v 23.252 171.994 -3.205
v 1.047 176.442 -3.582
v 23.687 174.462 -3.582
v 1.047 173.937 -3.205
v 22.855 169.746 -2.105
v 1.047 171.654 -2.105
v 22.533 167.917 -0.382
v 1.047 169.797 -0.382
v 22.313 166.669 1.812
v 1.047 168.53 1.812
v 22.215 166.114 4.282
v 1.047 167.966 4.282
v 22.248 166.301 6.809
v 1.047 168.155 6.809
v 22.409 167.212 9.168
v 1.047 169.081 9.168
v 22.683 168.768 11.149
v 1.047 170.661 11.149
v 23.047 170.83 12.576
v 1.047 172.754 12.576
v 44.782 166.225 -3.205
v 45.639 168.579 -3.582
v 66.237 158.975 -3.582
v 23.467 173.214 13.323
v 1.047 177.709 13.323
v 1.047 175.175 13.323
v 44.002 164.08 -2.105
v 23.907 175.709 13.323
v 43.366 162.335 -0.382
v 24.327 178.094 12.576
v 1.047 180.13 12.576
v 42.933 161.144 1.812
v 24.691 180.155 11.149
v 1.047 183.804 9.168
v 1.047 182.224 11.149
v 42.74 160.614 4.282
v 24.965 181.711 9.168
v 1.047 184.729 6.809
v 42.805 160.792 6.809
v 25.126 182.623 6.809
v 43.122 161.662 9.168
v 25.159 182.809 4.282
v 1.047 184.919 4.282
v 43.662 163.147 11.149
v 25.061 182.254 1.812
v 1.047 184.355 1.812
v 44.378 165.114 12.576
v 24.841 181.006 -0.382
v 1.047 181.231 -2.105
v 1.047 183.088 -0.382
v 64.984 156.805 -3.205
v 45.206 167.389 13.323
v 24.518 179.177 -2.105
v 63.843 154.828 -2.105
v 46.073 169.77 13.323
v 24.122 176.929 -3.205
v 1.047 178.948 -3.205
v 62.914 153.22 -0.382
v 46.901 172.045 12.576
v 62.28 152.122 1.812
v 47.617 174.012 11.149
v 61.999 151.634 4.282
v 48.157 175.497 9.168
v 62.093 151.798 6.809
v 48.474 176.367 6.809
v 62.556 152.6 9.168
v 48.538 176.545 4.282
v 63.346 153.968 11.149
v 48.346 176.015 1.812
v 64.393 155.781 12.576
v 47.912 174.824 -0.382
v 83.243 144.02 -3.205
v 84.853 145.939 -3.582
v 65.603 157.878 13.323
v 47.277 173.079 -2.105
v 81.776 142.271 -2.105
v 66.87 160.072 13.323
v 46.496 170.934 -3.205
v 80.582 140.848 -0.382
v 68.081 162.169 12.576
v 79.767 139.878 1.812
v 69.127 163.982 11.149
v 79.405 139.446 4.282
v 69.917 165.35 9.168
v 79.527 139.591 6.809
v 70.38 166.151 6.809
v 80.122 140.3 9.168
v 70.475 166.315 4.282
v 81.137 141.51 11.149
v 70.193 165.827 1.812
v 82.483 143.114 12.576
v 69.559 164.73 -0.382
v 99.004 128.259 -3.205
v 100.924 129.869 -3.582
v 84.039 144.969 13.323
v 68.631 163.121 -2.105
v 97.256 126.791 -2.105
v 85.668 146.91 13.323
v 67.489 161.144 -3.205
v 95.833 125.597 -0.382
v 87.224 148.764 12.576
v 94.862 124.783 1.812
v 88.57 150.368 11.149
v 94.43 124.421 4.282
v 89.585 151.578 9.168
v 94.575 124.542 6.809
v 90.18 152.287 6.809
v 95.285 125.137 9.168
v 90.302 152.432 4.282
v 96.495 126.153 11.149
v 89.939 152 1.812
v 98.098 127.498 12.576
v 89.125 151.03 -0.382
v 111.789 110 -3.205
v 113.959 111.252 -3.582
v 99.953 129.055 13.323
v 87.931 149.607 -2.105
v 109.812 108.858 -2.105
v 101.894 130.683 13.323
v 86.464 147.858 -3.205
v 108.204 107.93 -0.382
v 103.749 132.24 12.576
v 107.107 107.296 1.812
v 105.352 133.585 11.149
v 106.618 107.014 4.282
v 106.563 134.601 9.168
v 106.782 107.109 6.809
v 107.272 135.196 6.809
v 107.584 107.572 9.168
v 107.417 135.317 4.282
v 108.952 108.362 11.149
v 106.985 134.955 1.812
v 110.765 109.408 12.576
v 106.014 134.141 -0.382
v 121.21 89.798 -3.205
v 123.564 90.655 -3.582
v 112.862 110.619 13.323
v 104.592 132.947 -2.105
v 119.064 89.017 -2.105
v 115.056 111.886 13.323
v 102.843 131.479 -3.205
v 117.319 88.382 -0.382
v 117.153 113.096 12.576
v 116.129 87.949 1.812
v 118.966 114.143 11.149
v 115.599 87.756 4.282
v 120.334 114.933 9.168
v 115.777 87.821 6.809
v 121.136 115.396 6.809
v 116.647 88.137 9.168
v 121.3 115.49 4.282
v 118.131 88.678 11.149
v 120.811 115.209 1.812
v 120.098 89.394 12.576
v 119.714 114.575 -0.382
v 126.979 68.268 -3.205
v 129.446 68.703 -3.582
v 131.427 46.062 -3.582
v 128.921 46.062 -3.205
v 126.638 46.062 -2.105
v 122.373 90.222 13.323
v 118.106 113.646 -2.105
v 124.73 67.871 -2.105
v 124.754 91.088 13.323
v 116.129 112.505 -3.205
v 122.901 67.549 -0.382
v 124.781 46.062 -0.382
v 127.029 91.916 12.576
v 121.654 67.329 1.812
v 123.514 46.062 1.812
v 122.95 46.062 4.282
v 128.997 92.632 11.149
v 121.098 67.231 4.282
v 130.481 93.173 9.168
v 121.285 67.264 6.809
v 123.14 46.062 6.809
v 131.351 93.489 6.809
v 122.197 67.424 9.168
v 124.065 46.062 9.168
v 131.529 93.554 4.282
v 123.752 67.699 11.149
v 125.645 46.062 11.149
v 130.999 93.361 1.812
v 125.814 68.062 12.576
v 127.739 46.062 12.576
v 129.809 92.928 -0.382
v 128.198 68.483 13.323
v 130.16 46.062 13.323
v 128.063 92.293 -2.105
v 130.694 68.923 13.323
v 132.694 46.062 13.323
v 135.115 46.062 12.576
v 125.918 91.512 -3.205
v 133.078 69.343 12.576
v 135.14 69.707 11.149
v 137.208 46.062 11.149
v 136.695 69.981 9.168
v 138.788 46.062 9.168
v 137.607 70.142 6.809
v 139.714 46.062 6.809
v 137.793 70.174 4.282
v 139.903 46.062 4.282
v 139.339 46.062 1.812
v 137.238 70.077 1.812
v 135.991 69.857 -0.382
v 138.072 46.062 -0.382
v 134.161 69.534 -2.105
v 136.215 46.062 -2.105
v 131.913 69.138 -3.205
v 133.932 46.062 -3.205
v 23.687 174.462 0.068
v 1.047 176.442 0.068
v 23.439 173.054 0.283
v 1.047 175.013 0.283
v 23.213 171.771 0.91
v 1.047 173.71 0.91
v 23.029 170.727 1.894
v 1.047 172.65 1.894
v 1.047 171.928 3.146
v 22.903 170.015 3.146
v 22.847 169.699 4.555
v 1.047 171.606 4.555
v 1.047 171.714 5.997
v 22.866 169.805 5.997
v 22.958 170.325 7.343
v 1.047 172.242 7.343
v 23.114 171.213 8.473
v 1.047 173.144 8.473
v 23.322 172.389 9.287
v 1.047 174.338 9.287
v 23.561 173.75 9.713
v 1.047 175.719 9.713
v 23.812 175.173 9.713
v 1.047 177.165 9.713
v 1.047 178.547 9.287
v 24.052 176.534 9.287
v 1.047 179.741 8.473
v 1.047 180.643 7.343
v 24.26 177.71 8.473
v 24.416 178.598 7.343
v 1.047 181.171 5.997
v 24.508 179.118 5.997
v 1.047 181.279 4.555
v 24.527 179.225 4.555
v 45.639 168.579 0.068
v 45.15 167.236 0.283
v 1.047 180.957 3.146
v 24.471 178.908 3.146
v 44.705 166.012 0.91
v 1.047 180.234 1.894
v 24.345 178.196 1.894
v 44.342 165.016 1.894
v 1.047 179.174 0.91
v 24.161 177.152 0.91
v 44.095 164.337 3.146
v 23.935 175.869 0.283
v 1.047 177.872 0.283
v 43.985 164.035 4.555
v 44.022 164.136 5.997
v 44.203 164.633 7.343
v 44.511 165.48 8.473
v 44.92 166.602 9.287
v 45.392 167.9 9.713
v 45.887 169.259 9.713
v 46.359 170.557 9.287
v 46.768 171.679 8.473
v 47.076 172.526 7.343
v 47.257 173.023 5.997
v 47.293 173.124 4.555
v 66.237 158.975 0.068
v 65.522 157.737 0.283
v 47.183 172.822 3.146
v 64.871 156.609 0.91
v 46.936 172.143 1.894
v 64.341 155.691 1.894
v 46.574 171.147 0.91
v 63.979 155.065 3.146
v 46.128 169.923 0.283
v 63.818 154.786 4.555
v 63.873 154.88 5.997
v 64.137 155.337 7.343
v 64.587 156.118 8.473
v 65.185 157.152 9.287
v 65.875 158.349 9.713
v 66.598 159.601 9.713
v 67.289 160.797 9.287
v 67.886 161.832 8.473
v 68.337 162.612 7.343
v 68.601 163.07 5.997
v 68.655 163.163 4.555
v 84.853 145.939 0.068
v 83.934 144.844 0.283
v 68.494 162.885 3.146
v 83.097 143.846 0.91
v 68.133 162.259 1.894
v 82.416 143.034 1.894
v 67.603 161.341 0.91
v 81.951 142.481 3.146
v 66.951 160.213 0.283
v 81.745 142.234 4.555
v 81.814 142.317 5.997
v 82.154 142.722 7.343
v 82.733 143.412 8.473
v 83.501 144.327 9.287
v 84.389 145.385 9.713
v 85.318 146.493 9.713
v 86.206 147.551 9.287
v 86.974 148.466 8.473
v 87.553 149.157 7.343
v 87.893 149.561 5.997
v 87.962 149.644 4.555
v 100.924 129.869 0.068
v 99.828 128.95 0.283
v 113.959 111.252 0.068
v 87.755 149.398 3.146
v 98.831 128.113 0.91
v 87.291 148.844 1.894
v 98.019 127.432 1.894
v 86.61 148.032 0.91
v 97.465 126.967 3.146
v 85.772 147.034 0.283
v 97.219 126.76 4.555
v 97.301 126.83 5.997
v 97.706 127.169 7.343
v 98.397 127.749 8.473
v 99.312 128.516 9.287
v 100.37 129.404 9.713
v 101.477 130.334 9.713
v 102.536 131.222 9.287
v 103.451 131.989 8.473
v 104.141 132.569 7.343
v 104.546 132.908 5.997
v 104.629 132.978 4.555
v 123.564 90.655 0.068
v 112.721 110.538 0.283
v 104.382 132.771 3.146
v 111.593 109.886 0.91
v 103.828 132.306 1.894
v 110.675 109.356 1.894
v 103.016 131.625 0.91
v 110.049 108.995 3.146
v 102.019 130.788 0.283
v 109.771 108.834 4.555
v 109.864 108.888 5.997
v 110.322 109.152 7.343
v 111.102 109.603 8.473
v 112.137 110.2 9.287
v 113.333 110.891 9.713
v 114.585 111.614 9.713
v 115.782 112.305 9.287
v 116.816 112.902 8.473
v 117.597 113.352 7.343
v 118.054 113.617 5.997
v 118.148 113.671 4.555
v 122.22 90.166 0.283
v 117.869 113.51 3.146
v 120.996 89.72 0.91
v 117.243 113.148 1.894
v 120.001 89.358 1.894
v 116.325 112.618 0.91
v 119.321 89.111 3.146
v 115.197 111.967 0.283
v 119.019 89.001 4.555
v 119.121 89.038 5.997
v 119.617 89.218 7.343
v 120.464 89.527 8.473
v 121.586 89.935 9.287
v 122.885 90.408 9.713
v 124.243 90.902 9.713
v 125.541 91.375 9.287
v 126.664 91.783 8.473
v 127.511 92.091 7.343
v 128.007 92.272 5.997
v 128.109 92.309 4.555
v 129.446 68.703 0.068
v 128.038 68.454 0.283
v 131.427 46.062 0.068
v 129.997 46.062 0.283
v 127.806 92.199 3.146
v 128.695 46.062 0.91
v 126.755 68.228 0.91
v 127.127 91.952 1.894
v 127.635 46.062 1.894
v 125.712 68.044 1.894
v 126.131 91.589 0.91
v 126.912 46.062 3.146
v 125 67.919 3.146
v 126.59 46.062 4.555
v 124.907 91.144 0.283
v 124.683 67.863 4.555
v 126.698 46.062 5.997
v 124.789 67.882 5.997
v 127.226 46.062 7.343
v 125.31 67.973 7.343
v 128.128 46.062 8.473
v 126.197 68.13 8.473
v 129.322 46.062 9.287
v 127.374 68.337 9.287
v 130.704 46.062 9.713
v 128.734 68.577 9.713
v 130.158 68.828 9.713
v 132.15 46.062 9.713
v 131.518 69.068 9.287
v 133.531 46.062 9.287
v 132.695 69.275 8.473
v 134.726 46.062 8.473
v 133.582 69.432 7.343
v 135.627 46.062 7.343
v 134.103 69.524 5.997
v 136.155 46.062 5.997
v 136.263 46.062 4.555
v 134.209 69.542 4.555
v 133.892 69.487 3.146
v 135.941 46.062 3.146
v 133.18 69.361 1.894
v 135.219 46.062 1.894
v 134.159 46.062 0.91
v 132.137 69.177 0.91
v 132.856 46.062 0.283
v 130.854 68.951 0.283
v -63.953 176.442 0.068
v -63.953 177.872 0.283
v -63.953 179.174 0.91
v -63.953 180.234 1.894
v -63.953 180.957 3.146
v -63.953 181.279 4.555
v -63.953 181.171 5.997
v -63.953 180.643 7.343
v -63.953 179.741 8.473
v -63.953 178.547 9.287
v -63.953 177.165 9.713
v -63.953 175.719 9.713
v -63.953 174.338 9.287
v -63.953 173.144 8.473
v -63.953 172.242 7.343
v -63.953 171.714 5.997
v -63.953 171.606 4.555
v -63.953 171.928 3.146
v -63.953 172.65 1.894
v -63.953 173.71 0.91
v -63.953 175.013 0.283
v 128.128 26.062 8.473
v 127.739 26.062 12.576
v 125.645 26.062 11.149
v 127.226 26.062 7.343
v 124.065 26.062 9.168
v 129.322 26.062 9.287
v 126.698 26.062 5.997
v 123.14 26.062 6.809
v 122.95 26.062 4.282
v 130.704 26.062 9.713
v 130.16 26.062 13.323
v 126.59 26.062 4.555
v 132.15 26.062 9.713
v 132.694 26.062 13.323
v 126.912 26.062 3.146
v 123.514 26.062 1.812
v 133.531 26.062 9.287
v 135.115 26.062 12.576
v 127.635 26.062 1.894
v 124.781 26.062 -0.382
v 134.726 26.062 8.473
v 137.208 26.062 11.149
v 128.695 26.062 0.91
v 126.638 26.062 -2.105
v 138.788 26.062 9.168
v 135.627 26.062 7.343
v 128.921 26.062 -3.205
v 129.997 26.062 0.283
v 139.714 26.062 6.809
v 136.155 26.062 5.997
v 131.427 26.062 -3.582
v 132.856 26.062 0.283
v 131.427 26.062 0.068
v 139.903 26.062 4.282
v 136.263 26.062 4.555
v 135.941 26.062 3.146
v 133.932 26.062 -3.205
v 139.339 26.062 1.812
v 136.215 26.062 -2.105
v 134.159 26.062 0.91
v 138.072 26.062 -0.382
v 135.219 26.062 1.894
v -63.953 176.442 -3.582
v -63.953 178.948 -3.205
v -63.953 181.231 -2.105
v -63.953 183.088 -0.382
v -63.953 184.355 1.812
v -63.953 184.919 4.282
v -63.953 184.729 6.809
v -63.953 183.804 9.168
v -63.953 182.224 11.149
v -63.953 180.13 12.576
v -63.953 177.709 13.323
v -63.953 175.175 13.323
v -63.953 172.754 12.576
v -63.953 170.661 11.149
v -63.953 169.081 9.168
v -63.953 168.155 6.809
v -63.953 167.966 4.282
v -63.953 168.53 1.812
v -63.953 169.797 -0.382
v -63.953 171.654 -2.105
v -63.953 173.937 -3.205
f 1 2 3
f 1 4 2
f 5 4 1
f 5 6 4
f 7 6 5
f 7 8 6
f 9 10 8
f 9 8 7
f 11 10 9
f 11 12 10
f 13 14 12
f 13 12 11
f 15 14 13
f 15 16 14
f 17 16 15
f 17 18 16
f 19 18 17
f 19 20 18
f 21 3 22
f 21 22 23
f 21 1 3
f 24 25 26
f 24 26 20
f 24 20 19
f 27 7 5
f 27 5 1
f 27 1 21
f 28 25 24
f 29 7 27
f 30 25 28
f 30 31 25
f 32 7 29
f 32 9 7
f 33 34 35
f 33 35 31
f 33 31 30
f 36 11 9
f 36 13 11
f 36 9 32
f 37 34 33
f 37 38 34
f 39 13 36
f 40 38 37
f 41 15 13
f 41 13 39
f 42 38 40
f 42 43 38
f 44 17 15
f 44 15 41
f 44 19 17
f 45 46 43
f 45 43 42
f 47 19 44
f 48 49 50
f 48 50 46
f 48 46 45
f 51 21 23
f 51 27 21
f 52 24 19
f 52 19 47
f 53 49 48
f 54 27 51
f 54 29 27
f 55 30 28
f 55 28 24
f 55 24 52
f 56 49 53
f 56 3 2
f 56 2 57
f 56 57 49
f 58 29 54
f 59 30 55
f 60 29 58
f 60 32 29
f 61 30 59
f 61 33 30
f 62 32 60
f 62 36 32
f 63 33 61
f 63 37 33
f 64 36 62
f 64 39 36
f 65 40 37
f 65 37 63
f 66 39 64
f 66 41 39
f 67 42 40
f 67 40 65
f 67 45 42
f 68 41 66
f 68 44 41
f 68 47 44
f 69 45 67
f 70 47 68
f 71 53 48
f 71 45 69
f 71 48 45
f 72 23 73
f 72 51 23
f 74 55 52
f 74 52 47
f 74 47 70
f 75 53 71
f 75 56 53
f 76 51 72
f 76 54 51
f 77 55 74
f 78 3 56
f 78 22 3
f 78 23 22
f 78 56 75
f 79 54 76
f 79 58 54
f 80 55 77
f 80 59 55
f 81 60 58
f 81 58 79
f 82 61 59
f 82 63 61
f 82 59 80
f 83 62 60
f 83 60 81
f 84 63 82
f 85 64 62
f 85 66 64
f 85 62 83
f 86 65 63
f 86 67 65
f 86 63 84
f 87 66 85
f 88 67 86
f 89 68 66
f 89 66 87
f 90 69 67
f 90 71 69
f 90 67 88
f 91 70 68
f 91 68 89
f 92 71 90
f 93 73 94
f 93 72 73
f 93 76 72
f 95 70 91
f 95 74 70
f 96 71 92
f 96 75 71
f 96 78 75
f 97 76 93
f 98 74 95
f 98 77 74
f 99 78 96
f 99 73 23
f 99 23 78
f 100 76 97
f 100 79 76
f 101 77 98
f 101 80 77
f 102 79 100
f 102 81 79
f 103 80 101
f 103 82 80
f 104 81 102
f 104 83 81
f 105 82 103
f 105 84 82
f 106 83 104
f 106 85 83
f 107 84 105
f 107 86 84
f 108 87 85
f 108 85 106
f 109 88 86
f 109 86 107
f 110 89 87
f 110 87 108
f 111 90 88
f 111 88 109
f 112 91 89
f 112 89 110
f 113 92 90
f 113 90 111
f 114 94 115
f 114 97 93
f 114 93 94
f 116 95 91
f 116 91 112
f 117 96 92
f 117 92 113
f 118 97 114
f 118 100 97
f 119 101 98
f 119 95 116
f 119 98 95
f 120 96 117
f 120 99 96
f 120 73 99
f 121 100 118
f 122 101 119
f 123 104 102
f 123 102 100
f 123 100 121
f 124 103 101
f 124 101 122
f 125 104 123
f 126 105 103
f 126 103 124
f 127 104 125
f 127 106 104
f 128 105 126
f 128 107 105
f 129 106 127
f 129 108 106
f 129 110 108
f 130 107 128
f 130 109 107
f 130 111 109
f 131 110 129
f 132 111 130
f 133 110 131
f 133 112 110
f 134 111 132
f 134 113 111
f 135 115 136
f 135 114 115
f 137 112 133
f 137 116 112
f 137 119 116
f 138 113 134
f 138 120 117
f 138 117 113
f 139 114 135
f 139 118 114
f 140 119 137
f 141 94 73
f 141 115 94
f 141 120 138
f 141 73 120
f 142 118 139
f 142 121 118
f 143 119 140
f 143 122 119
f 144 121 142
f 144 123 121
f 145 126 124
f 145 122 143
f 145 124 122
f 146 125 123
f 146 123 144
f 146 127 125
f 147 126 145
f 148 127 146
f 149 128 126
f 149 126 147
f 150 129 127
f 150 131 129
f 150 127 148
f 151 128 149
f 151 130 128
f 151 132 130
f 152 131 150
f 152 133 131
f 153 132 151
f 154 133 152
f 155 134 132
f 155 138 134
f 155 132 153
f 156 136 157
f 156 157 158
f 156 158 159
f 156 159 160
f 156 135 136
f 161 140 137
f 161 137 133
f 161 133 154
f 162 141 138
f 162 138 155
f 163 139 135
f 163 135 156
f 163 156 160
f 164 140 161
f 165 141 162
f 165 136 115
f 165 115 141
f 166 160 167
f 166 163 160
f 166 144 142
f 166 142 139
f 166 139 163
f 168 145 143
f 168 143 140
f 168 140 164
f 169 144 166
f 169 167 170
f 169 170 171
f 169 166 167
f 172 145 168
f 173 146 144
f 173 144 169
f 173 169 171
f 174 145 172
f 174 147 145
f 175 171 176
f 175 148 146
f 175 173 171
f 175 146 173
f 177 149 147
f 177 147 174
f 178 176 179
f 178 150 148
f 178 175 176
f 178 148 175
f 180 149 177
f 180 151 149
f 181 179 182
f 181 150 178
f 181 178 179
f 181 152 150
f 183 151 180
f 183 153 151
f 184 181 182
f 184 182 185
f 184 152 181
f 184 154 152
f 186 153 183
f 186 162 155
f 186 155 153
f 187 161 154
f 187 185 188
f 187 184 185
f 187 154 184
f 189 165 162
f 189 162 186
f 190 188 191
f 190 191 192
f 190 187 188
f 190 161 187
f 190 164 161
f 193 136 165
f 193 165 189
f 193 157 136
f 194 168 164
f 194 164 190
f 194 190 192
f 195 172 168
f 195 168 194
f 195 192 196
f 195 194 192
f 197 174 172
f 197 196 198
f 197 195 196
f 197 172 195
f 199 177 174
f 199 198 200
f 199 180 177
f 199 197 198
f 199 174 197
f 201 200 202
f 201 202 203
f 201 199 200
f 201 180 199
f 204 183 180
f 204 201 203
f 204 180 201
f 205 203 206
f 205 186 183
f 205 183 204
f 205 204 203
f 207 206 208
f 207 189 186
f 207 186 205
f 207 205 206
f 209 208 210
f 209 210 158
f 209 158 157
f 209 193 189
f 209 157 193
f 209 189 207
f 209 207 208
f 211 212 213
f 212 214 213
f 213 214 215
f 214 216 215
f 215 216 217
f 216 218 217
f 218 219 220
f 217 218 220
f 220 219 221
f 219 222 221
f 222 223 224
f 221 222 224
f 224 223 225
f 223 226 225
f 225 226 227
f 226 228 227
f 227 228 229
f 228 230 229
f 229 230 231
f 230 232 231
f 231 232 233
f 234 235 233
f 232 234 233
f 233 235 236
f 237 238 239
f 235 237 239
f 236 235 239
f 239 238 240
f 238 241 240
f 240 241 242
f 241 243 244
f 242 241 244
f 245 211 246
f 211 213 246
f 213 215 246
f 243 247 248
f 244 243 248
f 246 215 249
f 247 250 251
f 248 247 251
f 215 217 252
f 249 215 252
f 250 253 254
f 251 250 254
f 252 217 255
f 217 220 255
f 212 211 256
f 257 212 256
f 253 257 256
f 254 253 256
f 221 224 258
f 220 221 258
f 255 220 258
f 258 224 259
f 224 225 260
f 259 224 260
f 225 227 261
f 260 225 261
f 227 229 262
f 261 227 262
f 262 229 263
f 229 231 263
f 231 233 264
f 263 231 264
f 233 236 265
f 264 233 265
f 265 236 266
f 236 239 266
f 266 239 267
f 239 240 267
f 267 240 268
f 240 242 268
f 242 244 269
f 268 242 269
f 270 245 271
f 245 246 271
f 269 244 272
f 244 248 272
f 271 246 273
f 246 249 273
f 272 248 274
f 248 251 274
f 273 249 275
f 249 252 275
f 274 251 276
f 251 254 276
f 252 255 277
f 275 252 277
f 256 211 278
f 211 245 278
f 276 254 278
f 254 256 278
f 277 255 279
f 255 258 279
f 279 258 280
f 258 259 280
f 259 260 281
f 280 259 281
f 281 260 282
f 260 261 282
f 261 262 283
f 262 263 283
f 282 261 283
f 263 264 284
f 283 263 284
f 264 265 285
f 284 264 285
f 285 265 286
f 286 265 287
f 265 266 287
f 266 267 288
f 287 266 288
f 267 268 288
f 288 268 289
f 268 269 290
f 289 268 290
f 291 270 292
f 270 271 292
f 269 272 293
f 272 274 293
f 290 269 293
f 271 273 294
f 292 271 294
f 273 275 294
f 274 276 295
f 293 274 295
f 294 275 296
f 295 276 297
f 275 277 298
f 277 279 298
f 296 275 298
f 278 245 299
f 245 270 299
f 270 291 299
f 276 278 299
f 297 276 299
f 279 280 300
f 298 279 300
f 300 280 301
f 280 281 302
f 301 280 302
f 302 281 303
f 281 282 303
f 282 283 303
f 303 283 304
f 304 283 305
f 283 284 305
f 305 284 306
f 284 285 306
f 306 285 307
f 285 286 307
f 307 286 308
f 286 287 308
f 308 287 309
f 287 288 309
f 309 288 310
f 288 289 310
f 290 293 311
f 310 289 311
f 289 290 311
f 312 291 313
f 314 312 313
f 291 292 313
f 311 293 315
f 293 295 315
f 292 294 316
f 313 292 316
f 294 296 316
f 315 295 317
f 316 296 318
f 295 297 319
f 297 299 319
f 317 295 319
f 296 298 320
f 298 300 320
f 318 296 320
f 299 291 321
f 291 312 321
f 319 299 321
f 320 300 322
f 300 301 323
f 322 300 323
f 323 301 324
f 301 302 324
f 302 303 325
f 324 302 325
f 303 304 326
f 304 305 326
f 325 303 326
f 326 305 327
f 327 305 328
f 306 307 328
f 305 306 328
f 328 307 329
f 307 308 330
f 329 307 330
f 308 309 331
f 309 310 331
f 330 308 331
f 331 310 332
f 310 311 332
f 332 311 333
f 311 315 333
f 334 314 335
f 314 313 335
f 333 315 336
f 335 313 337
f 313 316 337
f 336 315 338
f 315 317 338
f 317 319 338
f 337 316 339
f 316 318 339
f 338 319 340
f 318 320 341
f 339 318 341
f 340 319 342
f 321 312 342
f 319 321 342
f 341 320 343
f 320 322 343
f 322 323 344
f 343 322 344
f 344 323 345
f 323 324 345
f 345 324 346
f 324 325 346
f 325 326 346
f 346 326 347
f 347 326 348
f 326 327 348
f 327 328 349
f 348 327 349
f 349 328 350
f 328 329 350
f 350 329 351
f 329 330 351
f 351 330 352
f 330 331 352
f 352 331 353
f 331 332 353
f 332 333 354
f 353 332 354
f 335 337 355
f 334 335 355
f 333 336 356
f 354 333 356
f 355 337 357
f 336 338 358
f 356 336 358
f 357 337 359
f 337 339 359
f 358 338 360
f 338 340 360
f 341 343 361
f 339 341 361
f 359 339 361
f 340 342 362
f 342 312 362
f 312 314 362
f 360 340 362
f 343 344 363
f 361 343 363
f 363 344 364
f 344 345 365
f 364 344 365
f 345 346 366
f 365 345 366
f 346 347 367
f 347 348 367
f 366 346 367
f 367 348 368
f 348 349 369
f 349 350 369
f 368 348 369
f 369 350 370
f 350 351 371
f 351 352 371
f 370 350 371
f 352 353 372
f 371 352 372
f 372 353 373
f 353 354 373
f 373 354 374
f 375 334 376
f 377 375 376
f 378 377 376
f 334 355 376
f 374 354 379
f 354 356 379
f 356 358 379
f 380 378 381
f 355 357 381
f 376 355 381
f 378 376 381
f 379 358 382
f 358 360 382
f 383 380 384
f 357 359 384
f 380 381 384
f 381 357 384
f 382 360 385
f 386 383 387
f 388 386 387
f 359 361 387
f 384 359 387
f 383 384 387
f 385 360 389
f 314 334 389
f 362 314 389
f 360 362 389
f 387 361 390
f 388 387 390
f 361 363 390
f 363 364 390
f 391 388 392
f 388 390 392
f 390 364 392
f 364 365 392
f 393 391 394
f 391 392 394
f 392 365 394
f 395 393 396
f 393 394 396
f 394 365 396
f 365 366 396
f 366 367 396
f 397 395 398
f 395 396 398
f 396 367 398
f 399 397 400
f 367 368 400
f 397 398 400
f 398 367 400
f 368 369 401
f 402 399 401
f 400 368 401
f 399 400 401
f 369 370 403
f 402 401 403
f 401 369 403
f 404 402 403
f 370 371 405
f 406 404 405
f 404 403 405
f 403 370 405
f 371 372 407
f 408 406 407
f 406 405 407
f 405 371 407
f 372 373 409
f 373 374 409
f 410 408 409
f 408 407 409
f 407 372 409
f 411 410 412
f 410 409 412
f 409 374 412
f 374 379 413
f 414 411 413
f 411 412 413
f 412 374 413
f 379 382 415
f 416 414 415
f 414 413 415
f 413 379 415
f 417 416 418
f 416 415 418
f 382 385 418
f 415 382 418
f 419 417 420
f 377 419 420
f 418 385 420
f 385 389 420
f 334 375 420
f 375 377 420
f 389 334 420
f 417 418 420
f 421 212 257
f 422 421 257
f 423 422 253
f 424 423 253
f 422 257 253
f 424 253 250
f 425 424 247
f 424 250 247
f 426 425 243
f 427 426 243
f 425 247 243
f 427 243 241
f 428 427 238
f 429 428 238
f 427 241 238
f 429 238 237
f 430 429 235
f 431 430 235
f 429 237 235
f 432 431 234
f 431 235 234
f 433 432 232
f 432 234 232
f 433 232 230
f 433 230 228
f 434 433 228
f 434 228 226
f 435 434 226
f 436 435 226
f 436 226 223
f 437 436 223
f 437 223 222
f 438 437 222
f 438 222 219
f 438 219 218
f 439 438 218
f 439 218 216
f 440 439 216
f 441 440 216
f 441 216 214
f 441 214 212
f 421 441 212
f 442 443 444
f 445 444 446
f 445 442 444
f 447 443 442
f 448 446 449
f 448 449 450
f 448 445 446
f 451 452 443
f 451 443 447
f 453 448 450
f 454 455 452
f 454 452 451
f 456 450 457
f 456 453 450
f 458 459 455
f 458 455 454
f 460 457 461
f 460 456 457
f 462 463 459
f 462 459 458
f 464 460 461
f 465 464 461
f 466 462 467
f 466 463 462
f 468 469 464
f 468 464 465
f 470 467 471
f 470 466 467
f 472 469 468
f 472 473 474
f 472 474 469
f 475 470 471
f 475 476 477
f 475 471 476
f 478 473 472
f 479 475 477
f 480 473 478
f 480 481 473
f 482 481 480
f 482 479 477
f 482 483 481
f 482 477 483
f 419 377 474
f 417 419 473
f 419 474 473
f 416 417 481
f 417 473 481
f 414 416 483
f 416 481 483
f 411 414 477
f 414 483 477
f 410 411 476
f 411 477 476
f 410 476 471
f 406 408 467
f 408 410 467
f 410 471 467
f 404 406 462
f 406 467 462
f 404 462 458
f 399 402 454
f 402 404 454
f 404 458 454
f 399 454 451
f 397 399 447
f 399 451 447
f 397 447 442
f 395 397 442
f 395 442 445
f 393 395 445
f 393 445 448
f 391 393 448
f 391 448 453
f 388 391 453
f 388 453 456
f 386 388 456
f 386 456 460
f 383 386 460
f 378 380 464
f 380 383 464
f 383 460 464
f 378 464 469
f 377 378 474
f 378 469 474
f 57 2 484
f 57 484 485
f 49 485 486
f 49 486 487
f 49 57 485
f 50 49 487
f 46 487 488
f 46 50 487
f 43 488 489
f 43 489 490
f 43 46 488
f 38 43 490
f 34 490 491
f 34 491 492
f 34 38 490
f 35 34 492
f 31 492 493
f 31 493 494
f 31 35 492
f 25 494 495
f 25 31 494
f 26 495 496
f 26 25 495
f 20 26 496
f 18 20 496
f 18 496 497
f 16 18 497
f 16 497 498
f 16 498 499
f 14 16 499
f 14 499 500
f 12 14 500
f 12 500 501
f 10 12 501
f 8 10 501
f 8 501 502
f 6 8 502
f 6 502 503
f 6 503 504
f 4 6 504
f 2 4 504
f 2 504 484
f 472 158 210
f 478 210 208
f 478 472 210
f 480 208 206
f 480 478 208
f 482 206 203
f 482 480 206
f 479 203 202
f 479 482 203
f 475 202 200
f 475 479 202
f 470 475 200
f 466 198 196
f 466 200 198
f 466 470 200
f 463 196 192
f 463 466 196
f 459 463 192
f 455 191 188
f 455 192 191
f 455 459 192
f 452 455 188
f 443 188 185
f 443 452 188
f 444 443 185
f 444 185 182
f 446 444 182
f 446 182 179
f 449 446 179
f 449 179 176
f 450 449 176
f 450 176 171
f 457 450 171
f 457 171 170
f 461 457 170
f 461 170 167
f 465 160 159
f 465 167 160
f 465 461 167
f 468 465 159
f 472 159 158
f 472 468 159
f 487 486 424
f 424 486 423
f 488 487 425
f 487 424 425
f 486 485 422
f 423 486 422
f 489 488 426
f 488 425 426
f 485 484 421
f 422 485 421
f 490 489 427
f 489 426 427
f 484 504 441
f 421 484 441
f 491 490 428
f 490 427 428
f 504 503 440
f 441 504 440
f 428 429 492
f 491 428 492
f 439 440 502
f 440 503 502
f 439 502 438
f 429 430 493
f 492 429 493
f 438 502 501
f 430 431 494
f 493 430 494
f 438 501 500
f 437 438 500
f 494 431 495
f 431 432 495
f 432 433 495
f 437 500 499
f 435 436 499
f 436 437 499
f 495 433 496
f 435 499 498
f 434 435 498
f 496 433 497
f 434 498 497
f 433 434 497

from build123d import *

# Parameters (mm, degrees)
SKETCH2_R   = 8.5
SKETCH2_R_2 = 4.85


with BuildPart() as part:
    # Sweep1: sweep along a curve in space
    with BuildLine() as sweep1_path:
        Line((-63.953291268, 176.442341084, 4.917581679), (1.046708732, 176.442341084, 4.917581679))
        ThreePointArc((1.046708732, 176.442341084, 4.917581679), (93.239290863, 138.254923215, 4.917581679), (131.426708732, 46.062341084, 4.917581679))
        Line((131.426708732, 26.062341084, 4.917581679), (131.426708732, 46.062341084, 4.917581679))
    # Sketch2 → Sweep1 (sweep)
    with BuildSketch(Plane(origin=(-63.953291268, 176.442341084, 4.917581679), x_dir=(0, 0, -1), z_dir=(1, 0, 0))):
        Circle(SKETCH2_R)
        Circle(SKETCH2_R_2, mode=Mode.SUBTRACT)
    sweep(path=sweep1_path.line)


solid = part.part
